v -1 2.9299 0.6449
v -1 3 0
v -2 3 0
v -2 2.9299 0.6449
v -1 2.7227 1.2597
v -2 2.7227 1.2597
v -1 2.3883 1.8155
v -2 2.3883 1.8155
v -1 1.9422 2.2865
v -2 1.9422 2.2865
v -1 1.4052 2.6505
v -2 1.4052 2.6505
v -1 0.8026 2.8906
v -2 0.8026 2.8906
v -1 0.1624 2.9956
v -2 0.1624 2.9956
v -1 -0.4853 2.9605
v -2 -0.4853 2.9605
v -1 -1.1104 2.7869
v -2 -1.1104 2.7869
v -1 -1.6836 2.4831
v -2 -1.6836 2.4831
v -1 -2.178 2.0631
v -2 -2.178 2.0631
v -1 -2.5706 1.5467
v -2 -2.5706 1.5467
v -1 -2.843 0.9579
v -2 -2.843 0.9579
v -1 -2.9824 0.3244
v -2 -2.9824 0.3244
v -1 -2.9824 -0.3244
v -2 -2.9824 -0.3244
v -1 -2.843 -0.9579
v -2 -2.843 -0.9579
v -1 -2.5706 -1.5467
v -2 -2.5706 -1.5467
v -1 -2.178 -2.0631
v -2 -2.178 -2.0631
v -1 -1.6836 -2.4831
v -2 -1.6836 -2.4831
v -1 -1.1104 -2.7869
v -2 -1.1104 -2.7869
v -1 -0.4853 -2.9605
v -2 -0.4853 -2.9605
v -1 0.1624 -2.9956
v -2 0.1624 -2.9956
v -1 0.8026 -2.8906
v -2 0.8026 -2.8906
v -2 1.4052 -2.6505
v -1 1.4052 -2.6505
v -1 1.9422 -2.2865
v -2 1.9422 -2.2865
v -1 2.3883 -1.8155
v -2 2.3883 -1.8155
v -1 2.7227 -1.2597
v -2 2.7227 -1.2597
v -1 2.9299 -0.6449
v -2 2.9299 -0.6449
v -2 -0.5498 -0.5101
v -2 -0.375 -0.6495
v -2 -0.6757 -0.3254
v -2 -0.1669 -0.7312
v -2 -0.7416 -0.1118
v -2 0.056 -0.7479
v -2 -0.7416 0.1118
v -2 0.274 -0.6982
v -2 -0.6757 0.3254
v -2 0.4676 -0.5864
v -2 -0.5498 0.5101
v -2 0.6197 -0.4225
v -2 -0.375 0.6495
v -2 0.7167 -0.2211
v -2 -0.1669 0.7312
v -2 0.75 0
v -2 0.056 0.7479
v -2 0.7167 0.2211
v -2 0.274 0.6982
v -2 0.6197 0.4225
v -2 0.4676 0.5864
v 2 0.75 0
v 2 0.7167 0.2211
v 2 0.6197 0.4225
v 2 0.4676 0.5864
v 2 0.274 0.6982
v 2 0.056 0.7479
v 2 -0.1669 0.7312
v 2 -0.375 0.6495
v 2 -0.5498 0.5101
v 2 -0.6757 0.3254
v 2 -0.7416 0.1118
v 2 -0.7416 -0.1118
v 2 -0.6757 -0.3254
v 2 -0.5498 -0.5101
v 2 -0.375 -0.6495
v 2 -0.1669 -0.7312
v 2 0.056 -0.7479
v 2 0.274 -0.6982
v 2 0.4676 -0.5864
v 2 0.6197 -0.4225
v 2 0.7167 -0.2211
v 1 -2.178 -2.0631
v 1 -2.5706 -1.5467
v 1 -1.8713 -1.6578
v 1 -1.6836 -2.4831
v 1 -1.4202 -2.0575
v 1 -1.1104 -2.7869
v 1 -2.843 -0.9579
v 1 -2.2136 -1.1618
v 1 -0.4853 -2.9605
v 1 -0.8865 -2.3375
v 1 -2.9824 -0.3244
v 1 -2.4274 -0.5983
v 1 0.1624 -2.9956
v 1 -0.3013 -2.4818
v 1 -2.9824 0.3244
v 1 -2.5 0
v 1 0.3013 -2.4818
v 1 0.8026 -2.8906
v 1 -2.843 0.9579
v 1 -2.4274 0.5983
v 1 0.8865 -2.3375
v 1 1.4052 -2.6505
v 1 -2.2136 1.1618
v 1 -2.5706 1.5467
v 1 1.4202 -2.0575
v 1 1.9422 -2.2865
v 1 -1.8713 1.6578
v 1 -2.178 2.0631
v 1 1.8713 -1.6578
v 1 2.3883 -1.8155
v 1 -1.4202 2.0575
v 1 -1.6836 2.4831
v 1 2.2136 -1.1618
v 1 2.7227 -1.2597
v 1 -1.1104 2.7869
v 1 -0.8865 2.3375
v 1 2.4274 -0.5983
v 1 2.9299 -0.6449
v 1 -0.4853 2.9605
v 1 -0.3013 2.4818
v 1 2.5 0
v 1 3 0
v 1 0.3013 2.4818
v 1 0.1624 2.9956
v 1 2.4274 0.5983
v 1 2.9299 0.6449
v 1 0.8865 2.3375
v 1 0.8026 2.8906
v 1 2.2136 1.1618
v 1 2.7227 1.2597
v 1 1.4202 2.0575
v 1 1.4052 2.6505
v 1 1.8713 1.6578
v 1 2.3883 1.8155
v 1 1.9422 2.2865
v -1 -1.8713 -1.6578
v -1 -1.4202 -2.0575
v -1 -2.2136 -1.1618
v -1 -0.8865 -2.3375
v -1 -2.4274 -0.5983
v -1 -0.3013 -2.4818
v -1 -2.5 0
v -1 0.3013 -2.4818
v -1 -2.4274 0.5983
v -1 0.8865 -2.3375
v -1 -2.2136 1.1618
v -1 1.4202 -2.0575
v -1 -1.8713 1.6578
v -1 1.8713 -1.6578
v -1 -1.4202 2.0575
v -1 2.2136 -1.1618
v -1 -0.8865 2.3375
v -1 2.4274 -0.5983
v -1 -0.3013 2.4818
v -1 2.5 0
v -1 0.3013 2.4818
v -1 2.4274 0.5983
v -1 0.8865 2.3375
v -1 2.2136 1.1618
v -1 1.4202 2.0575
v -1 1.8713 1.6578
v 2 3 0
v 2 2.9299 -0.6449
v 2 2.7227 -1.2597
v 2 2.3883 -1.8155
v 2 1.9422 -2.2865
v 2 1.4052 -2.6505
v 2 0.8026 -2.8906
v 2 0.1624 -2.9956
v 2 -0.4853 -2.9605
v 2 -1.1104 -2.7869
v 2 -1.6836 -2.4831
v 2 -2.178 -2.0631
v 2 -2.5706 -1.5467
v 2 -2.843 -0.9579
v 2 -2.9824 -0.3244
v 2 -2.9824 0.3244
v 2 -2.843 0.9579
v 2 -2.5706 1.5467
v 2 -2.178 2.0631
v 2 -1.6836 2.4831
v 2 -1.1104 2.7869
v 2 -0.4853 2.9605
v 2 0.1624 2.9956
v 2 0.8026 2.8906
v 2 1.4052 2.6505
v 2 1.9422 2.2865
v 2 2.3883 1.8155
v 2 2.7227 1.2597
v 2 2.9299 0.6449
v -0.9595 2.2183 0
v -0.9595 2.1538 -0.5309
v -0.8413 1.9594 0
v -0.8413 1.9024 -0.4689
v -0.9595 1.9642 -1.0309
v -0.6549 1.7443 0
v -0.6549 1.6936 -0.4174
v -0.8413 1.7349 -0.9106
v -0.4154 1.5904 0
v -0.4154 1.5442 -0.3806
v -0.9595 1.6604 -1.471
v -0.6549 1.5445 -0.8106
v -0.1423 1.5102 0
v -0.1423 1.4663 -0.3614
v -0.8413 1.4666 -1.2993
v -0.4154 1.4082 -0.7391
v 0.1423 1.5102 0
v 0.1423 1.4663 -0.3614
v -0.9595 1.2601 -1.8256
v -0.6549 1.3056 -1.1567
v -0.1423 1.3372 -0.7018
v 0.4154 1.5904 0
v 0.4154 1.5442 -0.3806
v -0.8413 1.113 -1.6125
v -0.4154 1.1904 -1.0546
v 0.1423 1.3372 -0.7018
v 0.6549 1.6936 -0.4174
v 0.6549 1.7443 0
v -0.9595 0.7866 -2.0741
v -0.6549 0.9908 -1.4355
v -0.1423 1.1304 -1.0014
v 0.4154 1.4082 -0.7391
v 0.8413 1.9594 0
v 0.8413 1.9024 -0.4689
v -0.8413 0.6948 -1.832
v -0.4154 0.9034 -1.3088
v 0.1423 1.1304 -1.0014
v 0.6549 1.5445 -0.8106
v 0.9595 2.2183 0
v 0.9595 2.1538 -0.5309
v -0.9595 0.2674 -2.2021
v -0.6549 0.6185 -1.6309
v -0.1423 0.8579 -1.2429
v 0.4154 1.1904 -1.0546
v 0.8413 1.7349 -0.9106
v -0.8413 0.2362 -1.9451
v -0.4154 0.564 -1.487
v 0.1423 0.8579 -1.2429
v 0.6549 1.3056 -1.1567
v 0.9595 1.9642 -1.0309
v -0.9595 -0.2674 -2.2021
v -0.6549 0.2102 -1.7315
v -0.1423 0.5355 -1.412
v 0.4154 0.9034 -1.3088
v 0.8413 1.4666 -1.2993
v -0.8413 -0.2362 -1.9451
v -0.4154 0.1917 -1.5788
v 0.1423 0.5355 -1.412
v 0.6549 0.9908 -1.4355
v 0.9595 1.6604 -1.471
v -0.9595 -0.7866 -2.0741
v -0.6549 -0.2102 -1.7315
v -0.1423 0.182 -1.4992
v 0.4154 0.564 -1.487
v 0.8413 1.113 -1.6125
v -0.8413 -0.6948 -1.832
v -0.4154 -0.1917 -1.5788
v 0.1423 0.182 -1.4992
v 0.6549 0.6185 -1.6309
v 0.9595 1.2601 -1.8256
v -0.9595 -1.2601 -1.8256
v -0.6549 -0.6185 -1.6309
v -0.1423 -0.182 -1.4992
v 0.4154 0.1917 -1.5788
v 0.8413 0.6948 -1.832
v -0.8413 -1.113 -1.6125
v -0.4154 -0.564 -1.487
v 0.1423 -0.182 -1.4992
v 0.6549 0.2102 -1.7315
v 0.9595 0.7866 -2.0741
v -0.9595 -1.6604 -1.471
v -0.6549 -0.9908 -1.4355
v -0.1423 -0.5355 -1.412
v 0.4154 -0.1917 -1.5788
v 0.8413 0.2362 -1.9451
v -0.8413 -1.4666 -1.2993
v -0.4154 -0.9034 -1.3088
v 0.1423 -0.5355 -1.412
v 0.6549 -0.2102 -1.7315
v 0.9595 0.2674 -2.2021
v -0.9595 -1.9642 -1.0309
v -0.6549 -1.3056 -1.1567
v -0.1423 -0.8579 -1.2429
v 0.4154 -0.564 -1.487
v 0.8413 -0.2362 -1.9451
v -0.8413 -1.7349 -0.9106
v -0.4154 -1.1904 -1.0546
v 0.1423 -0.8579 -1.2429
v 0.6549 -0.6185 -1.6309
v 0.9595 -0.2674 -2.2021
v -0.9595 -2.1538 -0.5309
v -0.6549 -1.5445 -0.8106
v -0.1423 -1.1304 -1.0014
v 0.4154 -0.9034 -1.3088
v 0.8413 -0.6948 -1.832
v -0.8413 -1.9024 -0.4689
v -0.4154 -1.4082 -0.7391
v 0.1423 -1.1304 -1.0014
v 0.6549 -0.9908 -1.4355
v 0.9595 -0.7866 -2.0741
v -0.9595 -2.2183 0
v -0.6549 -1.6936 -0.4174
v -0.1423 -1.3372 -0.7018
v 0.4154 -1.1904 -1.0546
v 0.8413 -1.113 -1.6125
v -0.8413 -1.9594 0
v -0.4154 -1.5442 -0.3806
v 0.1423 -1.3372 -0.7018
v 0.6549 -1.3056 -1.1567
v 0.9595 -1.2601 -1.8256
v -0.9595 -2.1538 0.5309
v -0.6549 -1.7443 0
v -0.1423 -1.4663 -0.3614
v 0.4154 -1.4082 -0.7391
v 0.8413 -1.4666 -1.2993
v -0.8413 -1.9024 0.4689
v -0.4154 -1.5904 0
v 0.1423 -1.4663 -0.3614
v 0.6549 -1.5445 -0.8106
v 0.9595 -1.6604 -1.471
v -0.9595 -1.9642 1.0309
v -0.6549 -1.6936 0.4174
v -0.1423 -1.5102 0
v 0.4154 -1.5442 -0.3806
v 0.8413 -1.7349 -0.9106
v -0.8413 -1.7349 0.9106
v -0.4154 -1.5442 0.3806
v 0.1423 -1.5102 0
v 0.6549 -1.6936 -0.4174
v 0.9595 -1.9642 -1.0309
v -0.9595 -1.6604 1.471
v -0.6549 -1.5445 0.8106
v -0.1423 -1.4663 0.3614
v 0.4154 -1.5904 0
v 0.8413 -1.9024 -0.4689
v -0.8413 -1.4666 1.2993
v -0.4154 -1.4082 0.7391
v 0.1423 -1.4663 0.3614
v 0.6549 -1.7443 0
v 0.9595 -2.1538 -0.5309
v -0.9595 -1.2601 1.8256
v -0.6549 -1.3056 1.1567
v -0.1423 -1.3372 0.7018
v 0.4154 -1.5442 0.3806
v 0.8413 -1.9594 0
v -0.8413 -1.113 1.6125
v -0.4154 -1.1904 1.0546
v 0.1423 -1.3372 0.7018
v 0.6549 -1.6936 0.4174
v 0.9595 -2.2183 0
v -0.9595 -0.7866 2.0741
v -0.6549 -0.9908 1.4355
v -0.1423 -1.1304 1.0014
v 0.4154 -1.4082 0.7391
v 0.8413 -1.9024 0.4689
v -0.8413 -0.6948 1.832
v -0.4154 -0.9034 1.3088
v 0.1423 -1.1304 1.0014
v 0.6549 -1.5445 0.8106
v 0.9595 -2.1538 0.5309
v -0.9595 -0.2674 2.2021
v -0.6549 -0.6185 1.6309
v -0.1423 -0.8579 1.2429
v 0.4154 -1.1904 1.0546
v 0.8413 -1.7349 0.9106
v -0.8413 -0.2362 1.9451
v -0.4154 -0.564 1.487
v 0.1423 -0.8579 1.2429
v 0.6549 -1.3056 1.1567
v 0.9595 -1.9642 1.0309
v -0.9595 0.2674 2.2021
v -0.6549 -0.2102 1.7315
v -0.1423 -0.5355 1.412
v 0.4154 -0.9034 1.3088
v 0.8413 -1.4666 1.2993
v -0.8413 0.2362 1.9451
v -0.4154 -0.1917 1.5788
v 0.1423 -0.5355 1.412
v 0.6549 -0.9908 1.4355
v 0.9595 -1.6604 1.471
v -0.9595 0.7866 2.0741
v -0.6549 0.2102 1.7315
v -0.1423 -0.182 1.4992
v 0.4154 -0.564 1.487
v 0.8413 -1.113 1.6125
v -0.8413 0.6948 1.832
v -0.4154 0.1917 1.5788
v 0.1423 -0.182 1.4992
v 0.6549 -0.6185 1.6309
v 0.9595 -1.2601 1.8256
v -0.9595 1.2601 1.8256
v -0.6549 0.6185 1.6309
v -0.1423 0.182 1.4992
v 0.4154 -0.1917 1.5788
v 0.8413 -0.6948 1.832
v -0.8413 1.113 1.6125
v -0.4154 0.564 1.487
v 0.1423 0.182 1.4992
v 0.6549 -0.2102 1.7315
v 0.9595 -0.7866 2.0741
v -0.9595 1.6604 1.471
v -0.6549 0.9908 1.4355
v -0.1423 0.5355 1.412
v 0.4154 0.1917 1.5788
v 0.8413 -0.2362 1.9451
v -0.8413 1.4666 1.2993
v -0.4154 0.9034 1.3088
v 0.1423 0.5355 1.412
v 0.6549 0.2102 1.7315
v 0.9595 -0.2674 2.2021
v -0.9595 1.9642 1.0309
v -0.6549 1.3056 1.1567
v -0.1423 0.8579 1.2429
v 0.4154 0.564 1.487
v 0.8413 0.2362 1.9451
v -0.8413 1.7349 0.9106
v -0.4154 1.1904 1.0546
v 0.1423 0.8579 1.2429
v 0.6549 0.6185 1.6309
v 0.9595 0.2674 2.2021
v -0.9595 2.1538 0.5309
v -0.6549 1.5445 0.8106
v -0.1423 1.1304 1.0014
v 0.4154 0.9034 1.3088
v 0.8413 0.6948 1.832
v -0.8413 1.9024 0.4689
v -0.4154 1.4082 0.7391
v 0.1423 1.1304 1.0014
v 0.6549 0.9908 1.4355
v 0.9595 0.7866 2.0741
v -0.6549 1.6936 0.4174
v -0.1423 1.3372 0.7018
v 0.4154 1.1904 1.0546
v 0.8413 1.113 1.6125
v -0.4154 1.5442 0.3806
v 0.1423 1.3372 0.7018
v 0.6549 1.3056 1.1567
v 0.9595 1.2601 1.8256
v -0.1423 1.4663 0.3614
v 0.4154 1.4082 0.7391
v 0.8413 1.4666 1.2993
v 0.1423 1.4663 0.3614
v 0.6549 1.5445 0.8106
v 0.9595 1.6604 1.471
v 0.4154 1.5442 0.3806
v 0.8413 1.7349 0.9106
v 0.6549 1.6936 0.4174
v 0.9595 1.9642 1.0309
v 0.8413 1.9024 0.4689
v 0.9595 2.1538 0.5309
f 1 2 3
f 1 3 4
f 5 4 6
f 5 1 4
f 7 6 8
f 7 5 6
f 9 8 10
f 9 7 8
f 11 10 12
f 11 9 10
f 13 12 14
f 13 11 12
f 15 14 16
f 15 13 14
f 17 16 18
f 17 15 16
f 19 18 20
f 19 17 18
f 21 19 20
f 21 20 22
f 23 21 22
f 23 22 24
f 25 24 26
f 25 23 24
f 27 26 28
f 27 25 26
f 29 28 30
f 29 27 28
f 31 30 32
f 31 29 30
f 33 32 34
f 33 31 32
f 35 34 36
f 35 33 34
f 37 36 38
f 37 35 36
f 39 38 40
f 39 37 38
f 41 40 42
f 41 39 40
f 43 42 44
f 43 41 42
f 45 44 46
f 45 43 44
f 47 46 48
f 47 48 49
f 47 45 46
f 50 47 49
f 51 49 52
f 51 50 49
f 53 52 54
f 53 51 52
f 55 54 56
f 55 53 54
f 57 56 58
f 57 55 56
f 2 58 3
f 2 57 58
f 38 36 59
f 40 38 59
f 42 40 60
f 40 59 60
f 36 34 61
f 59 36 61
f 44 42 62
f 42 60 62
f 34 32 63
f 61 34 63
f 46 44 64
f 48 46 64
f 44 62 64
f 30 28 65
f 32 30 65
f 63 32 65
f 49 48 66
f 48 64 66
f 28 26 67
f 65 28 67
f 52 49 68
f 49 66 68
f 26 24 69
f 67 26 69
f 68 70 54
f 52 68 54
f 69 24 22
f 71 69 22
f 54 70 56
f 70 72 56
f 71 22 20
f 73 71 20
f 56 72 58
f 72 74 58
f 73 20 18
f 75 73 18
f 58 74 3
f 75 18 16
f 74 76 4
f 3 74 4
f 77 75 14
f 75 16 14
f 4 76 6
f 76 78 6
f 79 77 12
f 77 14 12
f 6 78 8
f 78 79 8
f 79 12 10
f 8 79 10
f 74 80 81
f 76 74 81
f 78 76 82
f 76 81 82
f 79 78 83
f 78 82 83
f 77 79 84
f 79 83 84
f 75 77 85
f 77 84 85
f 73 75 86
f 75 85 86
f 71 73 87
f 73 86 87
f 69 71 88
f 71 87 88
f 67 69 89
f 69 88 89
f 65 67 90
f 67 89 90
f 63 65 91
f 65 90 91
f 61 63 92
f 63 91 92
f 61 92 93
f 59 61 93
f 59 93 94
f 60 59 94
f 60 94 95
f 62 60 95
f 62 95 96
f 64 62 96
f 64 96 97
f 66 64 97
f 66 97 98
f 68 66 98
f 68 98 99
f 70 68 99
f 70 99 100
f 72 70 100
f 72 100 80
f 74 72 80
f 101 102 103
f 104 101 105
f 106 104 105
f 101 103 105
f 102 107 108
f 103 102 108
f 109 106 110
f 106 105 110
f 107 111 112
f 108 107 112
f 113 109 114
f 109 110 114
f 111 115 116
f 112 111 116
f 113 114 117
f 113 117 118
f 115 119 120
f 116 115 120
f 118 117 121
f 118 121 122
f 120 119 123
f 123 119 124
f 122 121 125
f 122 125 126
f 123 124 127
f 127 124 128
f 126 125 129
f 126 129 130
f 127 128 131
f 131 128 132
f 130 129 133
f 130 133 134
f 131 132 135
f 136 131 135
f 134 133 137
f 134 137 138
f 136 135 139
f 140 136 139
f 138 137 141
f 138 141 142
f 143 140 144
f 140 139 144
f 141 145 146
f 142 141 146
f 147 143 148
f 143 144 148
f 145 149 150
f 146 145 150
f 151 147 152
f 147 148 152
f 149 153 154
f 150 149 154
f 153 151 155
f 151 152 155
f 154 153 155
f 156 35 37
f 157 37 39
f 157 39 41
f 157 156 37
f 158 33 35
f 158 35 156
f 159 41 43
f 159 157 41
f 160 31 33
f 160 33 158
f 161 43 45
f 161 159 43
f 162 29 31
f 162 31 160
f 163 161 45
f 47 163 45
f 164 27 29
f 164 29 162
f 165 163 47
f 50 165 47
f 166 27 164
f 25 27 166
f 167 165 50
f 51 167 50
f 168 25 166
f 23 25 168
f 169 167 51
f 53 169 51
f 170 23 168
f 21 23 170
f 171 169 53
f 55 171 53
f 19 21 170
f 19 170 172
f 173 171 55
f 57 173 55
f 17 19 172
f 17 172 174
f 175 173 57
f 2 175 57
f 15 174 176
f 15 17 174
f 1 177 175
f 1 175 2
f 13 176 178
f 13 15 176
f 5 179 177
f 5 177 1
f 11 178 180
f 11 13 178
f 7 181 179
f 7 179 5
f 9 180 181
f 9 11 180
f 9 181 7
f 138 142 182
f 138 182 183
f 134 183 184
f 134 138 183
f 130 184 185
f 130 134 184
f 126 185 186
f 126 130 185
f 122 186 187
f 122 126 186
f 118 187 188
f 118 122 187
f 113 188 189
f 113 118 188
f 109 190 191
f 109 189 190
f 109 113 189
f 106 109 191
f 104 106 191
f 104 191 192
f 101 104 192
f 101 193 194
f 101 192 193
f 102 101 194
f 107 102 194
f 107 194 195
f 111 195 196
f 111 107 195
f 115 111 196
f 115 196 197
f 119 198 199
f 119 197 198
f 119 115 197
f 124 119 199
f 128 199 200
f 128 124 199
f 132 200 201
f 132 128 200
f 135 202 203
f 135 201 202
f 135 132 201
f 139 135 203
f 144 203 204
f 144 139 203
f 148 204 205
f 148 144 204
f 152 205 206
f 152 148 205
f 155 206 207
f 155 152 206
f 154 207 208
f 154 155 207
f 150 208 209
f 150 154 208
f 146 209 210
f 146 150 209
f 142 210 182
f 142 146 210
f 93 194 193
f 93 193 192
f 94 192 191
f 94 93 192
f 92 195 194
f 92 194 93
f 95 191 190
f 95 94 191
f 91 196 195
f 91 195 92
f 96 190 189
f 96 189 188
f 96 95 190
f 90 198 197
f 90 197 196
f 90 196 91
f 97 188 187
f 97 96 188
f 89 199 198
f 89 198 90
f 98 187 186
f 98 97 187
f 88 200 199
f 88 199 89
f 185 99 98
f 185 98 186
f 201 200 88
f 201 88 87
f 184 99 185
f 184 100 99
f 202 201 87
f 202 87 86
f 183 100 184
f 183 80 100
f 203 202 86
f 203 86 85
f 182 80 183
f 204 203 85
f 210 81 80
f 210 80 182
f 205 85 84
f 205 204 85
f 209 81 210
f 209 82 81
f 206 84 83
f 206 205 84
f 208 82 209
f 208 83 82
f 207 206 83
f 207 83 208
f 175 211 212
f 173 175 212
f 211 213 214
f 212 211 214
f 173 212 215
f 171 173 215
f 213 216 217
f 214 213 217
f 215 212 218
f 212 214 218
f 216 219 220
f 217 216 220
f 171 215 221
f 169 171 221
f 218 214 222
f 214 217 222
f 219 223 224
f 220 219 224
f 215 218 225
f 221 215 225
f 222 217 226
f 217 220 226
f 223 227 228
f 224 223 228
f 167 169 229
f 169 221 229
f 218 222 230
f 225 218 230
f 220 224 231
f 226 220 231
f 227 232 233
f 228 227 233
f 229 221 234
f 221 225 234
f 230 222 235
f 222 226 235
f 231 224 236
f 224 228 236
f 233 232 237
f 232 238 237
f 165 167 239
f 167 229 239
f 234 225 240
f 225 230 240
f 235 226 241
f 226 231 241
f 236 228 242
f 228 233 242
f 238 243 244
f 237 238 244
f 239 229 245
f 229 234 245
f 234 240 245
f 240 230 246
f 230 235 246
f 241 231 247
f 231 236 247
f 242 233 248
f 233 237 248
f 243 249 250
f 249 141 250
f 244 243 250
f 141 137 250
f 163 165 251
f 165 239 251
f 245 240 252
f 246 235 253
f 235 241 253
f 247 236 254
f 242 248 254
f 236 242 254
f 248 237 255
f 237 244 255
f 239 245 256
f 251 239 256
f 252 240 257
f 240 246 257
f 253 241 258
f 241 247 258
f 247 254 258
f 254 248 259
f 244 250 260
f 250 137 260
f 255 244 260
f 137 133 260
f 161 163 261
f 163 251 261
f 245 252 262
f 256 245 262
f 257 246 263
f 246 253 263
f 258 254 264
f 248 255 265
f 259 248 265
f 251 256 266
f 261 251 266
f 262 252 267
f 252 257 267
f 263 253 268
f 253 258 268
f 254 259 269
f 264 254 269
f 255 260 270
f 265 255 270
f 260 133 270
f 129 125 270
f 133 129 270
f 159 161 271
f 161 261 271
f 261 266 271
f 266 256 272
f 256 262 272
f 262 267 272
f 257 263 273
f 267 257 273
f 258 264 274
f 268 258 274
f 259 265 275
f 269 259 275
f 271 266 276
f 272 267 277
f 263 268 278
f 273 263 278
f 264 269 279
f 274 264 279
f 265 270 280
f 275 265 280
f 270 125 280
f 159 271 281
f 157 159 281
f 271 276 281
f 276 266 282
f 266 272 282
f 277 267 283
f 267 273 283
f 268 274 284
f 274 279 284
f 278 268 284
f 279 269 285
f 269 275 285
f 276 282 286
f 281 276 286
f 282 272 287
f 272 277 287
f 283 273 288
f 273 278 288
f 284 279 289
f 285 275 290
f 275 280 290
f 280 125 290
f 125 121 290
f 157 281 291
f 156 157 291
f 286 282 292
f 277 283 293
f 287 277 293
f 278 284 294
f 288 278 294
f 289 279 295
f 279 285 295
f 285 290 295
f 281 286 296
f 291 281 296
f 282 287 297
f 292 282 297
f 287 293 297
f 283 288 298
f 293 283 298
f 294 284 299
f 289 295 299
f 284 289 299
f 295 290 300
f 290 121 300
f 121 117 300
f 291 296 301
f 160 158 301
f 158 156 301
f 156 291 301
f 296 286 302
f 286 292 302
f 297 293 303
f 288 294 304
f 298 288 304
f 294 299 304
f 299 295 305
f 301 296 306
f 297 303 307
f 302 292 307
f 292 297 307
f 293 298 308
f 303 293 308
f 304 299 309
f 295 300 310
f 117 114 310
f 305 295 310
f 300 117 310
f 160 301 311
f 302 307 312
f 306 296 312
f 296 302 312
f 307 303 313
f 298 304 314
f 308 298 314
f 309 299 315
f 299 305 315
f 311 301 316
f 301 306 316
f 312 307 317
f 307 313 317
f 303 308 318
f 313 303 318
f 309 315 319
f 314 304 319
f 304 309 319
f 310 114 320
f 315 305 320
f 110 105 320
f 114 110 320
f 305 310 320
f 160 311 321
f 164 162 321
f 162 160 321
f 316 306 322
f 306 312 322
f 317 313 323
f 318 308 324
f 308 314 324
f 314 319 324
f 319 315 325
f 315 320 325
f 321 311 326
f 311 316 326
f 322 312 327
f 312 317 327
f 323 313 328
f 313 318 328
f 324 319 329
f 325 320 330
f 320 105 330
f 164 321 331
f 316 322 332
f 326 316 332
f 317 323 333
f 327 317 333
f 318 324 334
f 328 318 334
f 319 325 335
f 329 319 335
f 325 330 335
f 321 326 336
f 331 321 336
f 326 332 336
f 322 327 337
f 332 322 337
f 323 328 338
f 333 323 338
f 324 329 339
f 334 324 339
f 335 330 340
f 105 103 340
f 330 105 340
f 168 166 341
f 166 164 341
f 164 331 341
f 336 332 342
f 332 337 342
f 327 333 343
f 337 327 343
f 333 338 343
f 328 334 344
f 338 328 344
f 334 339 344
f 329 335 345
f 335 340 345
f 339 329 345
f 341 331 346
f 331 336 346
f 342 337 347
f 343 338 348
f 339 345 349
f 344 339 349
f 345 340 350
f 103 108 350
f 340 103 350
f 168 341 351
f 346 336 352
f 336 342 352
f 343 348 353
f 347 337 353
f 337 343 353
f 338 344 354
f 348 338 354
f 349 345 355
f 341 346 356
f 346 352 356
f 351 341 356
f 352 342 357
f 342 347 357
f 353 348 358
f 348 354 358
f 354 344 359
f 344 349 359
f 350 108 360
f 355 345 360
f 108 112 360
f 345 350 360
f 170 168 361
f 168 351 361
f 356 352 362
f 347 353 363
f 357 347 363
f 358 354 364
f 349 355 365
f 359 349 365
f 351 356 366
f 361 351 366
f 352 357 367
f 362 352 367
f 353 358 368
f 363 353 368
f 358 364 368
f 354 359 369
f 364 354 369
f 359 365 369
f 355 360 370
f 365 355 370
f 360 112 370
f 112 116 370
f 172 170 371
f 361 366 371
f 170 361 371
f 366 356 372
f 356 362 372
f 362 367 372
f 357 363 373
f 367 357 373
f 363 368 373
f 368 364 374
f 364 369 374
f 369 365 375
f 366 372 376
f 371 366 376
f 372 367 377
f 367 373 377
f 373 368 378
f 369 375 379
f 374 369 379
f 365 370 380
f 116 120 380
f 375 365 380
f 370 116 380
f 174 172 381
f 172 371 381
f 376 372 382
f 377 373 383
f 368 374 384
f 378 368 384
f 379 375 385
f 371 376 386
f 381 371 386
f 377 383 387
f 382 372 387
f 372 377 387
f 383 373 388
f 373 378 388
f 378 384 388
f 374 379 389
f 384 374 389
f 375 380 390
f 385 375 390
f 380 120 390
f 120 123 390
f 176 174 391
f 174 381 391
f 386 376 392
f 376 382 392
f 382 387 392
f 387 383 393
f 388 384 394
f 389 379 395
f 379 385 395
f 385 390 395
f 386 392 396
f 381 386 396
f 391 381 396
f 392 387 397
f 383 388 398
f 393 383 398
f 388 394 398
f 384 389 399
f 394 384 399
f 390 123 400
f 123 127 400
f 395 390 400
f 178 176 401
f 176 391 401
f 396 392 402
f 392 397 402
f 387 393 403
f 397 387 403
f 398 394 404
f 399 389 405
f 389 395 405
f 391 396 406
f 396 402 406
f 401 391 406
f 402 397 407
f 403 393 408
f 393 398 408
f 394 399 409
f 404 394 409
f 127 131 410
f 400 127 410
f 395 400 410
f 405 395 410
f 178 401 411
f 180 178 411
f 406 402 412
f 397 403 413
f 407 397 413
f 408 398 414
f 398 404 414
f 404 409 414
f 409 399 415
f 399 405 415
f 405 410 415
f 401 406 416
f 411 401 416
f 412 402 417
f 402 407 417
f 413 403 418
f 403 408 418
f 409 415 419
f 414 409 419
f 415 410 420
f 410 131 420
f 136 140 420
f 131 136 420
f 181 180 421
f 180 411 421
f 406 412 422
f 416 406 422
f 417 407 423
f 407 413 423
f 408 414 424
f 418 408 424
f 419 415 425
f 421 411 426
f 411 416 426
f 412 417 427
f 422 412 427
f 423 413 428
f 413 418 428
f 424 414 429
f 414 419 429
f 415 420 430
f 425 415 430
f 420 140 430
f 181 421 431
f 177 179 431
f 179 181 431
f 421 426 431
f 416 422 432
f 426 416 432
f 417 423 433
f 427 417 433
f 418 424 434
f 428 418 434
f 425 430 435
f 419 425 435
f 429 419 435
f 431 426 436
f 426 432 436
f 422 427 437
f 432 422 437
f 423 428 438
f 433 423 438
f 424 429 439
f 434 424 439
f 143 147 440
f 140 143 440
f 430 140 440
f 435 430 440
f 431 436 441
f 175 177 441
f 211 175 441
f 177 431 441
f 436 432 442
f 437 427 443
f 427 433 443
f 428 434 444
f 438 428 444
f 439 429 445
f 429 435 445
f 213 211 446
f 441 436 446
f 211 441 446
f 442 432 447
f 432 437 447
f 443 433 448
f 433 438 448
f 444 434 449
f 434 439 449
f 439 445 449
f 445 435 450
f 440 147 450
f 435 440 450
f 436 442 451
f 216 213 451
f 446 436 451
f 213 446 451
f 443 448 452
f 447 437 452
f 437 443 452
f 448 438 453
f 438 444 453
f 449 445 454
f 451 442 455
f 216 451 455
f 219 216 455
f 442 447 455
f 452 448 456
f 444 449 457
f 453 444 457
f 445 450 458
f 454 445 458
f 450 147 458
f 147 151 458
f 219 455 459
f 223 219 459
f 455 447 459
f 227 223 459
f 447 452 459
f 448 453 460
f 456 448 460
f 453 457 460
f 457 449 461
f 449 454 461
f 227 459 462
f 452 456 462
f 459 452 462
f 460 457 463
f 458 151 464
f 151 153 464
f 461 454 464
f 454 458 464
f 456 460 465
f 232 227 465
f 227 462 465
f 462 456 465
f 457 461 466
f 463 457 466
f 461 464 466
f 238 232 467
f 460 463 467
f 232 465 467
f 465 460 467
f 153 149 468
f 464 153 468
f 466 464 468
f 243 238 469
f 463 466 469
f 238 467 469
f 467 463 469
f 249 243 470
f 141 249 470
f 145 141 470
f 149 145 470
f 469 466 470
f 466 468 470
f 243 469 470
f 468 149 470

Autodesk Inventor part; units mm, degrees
ref_plane "YZ Plane" through (0, 0, 0) normal (1, 0, 0) x (0, 1, 0)
ref_plane "XZ Plane" through (0, 0, 0) normal (0, 1, 0) x (-1, 0, 0)
ref_plane "XY Plane" through (0, 0, 0) normal (0, 0, 1) x (1, 0, 0)
sketch "スケッチ1" plane through (0, 0, 0) normal (0, 0, 1) x (1, 0, 0)
  line L0 (-2, 0.75) -> (-2, 3)
  line L1 (2, 3) -> (2, 0.75)
  line L2 (-2, 0.75) -> (2, 0.75)
  line L3 (-2, 3) -> (-1, 3)
  line L4 (2, 3) -> (1, 3)
  line L5 (-1, 3) -> (-1, 2.5)
  line L6 (1, 3) -> (1, 2.5)
  arc A0 (-1, 2.5) -> (1, 2.5) centre (0, 2.5) ccw
  line L7 (0, 2.5) -> (0, 0.75) construction
  line L8 (-2.8, 0) -> (2.8, 0) projected
  point P0 (0, 0)
  dimension "d0" = 0.75
  dimension "d3" = 1
  dimension "d4" = 0.5
  dimension "d5" = 3
  dimension "d7" = 1
revolve "回転1" add sketch "スケッチ1" angle 360 about axis through (-10, 0, 0) along (1, 0, 0)
properties part number "Pulley_Small"
